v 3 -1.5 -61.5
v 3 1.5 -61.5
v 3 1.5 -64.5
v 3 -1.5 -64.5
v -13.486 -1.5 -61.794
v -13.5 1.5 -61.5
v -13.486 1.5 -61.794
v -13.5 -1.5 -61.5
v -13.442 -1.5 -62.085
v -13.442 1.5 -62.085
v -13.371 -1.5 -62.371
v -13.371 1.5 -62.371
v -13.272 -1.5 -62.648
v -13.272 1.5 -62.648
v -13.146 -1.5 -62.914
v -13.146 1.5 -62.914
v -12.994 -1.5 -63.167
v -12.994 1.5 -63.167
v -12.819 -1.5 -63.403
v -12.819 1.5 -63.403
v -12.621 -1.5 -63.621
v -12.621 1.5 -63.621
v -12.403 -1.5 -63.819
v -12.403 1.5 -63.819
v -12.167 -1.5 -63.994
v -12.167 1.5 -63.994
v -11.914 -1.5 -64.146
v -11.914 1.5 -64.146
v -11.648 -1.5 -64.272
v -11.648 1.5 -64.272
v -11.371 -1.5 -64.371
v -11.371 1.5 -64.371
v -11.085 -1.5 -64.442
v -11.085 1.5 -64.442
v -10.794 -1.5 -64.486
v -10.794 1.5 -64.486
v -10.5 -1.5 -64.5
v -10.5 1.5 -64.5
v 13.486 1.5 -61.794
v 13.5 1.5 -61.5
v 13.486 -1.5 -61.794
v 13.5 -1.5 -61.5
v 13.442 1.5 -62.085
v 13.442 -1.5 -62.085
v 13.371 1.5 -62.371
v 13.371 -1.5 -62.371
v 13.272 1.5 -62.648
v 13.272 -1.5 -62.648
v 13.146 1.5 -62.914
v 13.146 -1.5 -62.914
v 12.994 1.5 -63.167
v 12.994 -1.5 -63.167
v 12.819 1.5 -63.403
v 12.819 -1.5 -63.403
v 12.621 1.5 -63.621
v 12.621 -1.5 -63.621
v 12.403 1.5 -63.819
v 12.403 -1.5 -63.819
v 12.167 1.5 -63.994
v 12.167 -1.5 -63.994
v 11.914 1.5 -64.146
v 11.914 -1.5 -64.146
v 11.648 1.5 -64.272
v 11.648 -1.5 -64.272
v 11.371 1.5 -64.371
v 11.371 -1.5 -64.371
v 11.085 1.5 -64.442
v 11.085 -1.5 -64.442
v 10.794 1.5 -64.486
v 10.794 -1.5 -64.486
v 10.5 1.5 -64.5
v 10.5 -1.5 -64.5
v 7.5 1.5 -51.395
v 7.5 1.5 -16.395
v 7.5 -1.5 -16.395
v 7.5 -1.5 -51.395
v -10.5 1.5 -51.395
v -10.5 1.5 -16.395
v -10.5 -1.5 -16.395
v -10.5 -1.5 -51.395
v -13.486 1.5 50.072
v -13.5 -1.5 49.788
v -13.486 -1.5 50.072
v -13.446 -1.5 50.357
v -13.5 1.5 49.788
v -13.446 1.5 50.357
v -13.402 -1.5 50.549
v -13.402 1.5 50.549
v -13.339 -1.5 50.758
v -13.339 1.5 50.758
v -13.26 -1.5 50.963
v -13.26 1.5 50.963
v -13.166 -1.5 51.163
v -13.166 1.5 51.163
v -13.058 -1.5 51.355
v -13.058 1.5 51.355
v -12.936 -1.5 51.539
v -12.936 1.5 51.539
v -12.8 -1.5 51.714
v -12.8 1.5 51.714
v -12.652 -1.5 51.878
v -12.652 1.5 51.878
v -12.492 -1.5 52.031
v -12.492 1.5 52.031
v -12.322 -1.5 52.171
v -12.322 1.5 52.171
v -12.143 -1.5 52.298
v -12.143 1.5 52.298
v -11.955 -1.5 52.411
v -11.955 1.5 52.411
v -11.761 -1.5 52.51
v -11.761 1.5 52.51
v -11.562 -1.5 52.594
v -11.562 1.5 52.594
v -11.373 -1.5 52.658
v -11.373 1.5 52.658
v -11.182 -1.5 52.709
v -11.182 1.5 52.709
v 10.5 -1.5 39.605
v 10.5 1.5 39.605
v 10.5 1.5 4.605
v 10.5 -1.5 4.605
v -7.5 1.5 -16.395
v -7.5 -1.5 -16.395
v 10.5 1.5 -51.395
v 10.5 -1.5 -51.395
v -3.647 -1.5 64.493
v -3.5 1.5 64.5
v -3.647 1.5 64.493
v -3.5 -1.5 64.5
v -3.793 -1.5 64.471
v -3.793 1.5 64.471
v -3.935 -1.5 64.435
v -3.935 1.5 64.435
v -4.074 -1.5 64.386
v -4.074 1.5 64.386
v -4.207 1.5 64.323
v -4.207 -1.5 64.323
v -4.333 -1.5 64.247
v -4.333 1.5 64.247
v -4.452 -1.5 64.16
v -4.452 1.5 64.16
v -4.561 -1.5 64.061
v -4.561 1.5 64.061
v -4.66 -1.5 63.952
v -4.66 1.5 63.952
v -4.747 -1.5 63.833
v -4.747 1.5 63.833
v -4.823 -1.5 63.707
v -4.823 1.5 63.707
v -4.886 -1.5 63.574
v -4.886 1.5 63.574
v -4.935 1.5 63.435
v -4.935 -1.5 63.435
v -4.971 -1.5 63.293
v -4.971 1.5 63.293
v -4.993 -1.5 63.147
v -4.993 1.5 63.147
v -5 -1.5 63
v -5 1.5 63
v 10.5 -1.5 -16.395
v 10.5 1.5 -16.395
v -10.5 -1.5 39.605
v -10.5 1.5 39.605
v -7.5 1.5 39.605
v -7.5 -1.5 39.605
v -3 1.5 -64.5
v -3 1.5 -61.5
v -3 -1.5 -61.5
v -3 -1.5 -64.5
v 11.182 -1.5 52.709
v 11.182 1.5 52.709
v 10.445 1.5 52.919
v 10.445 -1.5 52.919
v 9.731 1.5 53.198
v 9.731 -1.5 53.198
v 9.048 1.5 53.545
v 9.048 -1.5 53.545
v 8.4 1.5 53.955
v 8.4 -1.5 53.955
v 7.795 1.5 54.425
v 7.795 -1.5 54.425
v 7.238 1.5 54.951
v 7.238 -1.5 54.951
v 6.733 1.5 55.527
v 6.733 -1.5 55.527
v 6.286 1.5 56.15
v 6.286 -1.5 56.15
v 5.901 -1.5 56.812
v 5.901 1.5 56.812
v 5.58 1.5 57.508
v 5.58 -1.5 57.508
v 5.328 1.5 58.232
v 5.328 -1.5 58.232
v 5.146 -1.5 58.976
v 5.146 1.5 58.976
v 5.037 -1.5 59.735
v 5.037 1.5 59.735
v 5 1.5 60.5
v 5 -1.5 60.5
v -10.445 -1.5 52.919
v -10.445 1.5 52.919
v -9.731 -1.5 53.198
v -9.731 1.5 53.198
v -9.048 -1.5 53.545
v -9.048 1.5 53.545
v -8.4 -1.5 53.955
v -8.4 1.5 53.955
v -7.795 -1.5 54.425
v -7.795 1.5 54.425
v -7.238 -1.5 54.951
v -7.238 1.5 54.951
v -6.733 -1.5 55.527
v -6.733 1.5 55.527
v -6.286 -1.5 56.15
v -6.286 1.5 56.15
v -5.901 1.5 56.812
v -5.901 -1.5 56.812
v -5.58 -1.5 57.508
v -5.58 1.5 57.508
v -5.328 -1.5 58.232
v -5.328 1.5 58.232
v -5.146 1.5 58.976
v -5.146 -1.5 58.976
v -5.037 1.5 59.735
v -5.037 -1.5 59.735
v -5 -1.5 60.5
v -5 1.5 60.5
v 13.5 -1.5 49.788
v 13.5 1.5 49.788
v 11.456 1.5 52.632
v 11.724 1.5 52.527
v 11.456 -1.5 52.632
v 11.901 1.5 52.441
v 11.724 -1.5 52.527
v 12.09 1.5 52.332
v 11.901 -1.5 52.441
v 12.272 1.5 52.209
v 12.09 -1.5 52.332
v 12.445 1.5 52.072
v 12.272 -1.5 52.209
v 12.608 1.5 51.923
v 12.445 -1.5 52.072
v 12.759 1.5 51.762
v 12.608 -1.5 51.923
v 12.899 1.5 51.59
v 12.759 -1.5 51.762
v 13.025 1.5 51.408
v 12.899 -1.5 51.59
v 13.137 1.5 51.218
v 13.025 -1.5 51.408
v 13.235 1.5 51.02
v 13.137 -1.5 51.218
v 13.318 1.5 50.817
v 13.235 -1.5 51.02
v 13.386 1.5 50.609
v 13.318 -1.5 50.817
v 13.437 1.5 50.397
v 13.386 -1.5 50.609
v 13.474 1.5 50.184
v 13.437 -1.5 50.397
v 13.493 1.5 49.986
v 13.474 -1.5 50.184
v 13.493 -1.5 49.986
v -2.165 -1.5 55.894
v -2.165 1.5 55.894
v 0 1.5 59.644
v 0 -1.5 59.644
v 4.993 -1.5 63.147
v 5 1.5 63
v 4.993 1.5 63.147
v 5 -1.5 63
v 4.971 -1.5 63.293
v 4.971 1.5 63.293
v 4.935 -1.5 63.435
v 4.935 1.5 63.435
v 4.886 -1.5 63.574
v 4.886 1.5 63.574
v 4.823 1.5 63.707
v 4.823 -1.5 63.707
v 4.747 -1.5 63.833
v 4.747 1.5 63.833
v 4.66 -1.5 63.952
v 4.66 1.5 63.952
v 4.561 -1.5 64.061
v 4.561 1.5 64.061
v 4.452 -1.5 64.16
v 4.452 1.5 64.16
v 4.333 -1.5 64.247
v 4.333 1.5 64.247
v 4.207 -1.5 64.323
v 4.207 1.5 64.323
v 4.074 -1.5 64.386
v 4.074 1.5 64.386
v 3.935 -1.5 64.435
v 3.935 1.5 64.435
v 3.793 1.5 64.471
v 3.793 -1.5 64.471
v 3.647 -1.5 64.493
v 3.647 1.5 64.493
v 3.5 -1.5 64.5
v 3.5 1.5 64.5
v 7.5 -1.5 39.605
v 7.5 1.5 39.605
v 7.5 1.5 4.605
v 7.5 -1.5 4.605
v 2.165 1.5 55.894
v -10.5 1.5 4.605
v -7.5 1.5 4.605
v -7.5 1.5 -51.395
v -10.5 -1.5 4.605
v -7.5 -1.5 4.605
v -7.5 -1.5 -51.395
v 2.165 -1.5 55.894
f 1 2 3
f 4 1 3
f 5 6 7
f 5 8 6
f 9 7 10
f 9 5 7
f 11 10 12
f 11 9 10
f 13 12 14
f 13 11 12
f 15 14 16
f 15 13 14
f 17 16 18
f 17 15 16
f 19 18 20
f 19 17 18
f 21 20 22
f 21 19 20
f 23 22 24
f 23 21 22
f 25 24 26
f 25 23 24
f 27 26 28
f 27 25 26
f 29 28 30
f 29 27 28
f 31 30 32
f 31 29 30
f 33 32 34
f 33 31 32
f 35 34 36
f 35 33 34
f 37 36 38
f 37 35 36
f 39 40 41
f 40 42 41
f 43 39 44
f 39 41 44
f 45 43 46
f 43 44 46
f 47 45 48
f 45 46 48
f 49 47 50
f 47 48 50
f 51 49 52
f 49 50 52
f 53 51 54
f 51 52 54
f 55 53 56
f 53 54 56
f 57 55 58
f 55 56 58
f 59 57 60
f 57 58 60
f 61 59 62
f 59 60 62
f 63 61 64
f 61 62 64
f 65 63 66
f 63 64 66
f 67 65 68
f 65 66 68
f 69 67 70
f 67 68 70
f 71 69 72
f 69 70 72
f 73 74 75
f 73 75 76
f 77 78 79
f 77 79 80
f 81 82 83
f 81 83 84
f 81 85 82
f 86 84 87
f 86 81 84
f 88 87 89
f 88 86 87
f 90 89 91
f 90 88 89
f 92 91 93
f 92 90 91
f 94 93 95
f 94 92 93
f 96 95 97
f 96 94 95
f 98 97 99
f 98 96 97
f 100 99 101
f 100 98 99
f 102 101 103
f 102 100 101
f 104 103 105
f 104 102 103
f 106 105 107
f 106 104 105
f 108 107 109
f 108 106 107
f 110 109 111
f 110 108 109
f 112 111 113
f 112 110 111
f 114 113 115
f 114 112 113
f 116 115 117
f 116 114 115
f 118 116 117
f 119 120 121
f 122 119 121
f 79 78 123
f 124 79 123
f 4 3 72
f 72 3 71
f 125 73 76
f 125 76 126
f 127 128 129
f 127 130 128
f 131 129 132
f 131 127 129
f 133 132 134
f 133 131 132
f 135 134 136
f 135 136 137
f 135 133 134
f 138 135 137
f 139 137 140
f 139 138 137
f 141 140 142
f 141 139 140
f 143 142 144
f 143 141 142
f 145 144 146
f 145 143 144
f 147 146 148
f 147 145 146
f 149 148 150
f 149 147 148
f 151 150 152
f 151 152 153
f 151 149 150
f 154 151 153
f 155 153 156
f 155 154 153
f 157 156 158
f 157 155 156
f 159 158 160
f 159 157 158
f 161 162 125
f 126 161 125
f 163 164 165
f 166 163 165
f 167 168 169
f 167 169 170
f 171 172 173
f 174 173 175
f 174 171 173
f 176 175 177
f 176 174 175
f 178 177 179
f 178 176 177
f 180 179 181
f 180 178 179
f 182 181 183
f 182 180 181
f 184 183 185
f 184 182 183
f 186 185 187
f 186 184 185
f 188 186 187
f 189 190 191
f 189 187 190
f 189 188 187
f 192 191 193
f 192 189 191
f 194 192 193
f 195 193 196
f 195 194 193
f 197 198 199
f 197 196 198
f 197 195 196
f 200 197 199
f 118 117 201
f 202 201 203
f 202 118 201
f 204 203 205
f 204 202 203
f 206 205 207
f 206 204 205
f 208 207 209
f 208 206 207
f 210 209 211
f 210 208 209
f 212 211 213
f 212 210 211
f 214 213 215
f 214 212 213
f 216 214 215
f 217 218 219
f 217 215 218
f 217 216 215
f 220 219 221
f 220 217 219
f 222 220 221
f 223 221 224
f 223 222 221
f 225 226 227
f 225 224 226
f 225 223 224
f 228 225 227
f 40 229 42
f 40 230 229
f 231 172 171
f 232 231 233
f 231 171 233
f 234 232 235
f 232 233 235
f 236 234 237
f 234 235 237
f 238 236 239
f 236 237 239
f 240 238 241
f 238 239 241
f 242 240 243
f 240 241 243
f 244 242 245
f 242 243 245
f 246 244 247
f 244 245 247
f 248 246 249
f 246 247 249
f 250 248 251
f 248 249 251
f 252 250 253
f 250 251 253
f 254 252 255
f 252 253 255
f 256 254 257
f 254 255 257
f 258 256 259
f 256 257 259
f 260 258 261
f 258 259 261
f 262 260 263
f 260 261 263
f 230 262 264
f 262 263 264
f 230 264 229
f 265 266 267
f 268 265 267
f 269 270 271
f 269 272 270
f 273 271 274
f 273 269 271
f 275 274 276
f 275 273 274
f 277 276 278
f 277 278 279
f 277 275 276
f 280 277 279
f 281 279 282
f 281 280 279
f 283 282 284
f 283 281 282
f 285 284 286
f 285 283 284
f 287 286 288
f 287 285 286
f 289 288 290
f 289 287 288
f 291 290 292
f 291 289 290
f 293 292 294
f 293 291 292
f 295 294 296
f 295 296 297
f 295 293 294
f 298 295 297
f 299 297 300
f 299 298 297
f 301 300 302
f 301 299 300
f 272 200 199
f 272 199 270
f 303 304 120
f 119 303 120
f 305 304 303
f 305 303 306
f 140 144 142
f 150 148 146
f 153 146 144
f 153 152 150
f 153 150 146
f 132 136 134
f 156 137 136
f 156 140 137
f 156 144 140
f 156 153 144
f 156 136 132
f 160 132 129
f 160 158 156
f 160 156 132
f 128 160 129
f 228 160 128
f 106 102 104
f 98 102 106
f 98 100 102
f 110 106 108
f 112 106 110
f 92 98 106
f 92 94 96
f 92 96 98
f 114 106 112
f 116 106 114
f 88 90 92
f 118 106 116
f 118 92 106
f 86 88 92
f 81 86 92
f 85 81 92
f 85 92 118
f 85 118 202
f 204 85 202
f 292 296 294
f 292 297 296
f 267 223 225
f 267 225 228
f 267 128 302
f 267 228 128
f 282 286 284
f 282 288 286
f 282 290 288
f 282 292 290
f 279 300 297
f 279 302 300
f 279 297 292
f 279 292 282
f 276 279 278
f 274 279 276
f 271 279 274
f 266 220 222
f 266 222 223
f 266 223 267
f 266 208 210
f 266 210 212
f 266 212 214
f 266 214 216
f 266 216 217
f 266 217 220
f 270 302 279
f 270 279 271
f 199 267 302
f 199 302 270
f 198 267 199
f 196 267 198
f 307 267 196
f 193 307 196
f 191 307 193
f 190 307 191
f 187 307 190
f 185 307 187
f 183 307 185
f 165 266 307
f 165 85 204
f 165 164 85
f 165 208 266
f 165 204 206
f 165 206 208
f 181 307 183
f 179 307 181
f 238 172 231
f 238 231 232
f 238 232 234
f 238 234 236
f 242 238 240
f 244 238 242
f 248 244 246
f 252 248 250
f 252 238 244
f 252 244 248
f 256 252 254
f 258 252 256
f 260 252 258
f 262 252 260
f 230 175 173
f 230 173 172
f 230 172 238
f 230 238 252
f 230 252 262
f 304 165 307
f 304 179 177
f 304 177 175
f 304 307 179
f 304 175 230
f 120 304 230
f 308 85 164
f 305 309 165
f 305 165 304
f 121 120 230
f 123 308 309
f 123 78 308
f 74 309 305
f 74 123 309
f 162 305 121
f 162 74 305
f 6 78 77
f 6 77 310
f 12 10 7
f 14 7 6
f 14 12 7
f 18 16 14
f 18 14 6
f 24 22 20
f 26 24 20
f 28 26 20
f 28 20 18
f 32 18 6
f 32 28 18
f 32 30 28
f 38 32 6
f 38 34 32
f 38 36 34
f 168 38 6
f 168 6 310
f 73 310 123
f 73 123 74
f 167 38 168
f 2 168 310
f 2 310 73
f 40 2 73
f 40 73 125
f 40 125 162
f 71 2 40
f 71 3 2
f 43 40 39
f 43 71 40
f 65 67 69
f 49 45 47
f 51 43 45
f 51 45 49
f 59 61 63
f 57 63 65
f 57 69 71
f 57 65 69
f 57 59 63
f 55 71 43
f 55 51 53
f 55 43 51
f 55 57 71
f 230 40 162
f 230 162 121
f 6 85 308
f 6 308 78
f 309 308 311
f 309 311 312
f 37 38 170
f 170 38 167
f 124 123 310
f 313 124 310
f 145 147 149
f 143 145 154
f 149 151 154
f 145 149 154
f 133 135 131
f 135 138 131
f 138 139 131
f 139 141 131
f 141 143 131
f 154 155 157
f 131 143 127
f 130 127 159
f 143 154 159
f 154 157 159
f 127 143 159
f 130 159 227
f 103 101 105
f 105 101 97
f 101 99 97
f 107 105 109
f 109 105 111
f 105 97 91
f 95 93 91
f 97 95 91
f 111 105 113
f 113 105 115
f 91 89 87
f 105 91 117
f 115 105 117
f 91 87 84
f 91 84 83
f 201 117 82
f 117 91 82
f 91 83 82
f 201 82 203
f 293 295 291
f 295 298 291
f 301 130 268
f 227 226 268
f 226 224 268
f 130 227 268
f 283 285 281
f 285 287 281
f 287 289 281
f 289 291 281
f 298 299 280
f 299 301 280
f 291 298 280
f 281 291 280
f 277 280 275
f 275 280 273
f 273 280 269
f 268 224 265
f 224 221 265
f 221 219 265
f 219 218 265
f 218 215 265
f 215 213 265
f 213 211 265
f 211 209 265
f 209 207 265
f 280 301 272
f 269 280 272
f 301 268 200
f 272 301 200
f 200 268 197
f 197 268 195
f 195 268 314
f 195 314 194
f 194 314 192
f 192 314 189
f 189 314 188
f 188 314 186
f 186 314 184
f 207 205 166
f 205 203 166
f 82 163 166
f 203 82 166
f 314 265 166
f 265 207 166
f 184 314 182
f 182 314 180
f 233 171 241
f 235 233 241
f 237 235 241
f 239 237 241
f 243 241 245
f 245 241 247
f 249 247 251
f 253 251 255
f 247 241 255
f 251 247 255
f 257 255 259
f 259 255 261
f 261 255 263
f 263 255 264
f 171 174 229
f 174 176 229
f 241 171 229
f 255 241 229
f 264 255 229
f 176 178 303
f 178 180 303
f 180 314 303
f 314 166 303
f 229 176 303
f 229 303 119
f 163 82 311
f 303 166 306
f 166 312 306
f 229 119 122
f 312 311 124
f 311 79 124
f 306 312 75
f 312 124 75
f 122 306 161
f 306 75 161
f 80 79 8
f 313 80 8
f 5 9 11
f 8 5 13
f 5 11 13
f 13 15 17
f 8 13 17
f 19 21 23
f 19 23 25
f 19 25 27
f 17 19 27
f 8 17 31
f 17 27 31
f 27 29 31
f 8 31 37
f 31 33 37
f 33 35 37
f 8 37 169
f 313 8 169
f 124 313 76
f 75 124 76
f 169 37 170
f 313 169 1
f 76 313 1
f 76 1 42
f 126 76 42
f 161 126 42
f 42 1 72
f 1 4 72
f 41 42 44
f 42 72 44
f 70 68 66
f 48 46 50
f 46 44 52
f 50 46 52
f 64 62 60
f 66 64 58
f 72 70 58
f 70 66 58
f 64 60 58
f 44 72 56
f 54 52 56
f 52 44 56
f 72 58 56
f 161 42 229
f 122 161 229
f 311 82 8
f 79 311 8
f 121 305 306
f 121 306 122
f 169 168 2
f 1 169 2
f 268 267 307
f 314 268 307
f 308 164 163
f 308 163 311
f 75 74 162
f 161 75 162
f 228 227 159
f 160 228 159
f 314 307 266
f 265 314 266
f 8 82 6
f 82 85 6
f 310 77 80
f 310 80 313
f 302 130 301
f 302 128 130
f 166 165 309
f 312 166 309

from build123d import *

# Parameters (mm, degrees)
SKETCH1_W               = 27
SKETCH1_H               = 129
BOSS_EXTRUDE1_DEPTH     = 1.5
FILLET1_R               = 3
SKETCH3_W               = 6
SKETCH3_H               = 3
CUT_EXTRUDE2_DEPTH      = 2.5
CUT_EXTRUDE2_DEPTH_BACK = 2.5
CUT_EXTRUDE4_DEPTH      = 2.5
CUT_EXTRUDE4_DEPTH_BACK = 2.5
FILLET2_R               = 3
FILLET2_2_R             = 1.5
CUT_EXTRUDE3_DEPTH      = 5
SKETCH2_W               = 3
SKETCH2_H               = 35
CUT_EXTRUDE1_DEPTH      = 2.5000001
CUT_EXTRUDE1_DEPTH_BACK = 2.5000001


with BuildPart() as part:
    # Sketch1 → Boss-Extrude1 (new body, symmetric)
    with BuildSketch(Plane(origin=(0, 0, 0), x_dir=(1, 0, 0), z_dir=(0, 1, 0))):
        Rectangle(SKETCH1_W, SKETCH1_H)
    extrude(amount=BOSS_EXTRUDE1_DEPTH, both=True)

    # Fillet1
    fillet1_edges = [part.edges().sort_by_distance(p)[0] for p in [
        (-13.5, 0, -64.5),
        (13.5, 0, -64.5),
    ]]
    fillet(fillet1_edges, radius=FILLET1_R)

    # Sketch3 → Cut-Extrude2 (cut, two sides)
    with BuildSketch(Plane(origin=(0, 0, 0), x_dir=(1, 0, 0), z_dir=(0, 1, 0))) as cut_extrude2_sk:
        with Locations((0, 63)):
            Rectangle(SKETCH3_W, SKETCH3_H)
    extrude(amount=CUT_EXTRUDE2_DEPTH, mode=Mode.SUBTRACT)
    extrude(cut_extrude2_sk.sketch, amount=-CUT_EXTRUDE2_DEPTH_BACK, mode=Mode.SUBTRACT)

    # Sketch5 → Cut-Extrude4 (cut, two sides)
    with BuildSketch(Plane(origin=(0, 0, 0), x_dir=(1, 0, 0), z_dir=(0, 1, 0))) as cut_extrude4_sk:
        with BuildLine():
            Line((-13.5, -52.5), (-13, -52.5))
            ThreePointArc((-13, -52.5), (-7.343145751, -54.843145751), (-5, -60.5))
            Line((-5, -60.5), (-5, -64.5))
            Line((-5, -64.5), (-13.5, -64.5))
            Line((-13.5, -64.5), (-13.5, -52.5))
        make_face()
        with BuildLine():
            Line((5, -60.5), (5, -64.5))
            Line((5, -64.5), (13.5, -64.5))
            Line((13.5, -64.5), (13.5, -52.5))
            Line((13.5, -52.5), (13, -52.5))
            ThreePointArc((13, -52.5), (7.343145751, -54.843145751), (5, -60.5))
        make_face()
    extrude(amount=CUT_EXTRUDE4_DEPTH, mode=Mode.SUBTRACT)
    extrude(cut_extrude4_sk.sketch, amount=-CUT_EXTRUDE4_DEPTH_BACK, mode=Mode.SUBTRACT)

    # Fillet2
    fillet2_edges = [part.edges().sort_by_distance(p)[0] for p in [
        (-13.5, 0, 52.5),
        (13.5, 0, 52.5),
    ]]
    fillet(fillet2_edges, radius=FILLET2_R)

    # Fillet2 2
    fillet2_2_edges = [part.edges().sort_by_distance(p)[0] for p in [
        (-5, 0, 64.5),
        (5, 0, 64.5),
    ]]
    fillet(fillet2_2_edges, radius=FILLET2_2_R)

    # Sketch4 → Cut-Extrude3 (cut, symmetric)
    with BuildSketch(Plane(origin=(0, 0, 0), x_dir=(1, 0, 0), z_dir=(0, 1, 0))):
        Polygon((0, -59.643928679), (2.165063509, -55.893928679), (-2.165063509, -55.893928679), align=None)
    extrude(amount=CUT_EXTRUDE3_DEPTH, both=True, mode=Mode.SUBTRACT)

    # Sketch2 → Cut-Extrude1 (cut, two sides)
    with BuildSketch(Plane(origin=(0, 0, 0), x_dir=(1, 0, 0), z_dir=(0, 1, 0))) as cut_extrude1_sk:
        with Locations((-9, 33.895)):
            Rectangle(SKETCH2_W, SKETCH2_H)
        with Locations((9, 33.895)):
            Rectangle(SKETCH2_W, SKETCH2_H)
        with Locations((9, -22.105)):
            Rectangle(SKETCH2_W, SKETCH2_H)
        with Locations((-9, -22.105)):
            Rectangle(SKETCH2_W, SKETCH2_H)
    extrude(amount=CUT_EXTRUDE1_DEPTH, mode=Mode.SUBTRACT)
    extrude(cut_extrude1_sk.sketch, amount=-CUT_EXTRUDE1_DEPTH_BACK, mode=Mode.SUBTRACT)


solid = part.part
